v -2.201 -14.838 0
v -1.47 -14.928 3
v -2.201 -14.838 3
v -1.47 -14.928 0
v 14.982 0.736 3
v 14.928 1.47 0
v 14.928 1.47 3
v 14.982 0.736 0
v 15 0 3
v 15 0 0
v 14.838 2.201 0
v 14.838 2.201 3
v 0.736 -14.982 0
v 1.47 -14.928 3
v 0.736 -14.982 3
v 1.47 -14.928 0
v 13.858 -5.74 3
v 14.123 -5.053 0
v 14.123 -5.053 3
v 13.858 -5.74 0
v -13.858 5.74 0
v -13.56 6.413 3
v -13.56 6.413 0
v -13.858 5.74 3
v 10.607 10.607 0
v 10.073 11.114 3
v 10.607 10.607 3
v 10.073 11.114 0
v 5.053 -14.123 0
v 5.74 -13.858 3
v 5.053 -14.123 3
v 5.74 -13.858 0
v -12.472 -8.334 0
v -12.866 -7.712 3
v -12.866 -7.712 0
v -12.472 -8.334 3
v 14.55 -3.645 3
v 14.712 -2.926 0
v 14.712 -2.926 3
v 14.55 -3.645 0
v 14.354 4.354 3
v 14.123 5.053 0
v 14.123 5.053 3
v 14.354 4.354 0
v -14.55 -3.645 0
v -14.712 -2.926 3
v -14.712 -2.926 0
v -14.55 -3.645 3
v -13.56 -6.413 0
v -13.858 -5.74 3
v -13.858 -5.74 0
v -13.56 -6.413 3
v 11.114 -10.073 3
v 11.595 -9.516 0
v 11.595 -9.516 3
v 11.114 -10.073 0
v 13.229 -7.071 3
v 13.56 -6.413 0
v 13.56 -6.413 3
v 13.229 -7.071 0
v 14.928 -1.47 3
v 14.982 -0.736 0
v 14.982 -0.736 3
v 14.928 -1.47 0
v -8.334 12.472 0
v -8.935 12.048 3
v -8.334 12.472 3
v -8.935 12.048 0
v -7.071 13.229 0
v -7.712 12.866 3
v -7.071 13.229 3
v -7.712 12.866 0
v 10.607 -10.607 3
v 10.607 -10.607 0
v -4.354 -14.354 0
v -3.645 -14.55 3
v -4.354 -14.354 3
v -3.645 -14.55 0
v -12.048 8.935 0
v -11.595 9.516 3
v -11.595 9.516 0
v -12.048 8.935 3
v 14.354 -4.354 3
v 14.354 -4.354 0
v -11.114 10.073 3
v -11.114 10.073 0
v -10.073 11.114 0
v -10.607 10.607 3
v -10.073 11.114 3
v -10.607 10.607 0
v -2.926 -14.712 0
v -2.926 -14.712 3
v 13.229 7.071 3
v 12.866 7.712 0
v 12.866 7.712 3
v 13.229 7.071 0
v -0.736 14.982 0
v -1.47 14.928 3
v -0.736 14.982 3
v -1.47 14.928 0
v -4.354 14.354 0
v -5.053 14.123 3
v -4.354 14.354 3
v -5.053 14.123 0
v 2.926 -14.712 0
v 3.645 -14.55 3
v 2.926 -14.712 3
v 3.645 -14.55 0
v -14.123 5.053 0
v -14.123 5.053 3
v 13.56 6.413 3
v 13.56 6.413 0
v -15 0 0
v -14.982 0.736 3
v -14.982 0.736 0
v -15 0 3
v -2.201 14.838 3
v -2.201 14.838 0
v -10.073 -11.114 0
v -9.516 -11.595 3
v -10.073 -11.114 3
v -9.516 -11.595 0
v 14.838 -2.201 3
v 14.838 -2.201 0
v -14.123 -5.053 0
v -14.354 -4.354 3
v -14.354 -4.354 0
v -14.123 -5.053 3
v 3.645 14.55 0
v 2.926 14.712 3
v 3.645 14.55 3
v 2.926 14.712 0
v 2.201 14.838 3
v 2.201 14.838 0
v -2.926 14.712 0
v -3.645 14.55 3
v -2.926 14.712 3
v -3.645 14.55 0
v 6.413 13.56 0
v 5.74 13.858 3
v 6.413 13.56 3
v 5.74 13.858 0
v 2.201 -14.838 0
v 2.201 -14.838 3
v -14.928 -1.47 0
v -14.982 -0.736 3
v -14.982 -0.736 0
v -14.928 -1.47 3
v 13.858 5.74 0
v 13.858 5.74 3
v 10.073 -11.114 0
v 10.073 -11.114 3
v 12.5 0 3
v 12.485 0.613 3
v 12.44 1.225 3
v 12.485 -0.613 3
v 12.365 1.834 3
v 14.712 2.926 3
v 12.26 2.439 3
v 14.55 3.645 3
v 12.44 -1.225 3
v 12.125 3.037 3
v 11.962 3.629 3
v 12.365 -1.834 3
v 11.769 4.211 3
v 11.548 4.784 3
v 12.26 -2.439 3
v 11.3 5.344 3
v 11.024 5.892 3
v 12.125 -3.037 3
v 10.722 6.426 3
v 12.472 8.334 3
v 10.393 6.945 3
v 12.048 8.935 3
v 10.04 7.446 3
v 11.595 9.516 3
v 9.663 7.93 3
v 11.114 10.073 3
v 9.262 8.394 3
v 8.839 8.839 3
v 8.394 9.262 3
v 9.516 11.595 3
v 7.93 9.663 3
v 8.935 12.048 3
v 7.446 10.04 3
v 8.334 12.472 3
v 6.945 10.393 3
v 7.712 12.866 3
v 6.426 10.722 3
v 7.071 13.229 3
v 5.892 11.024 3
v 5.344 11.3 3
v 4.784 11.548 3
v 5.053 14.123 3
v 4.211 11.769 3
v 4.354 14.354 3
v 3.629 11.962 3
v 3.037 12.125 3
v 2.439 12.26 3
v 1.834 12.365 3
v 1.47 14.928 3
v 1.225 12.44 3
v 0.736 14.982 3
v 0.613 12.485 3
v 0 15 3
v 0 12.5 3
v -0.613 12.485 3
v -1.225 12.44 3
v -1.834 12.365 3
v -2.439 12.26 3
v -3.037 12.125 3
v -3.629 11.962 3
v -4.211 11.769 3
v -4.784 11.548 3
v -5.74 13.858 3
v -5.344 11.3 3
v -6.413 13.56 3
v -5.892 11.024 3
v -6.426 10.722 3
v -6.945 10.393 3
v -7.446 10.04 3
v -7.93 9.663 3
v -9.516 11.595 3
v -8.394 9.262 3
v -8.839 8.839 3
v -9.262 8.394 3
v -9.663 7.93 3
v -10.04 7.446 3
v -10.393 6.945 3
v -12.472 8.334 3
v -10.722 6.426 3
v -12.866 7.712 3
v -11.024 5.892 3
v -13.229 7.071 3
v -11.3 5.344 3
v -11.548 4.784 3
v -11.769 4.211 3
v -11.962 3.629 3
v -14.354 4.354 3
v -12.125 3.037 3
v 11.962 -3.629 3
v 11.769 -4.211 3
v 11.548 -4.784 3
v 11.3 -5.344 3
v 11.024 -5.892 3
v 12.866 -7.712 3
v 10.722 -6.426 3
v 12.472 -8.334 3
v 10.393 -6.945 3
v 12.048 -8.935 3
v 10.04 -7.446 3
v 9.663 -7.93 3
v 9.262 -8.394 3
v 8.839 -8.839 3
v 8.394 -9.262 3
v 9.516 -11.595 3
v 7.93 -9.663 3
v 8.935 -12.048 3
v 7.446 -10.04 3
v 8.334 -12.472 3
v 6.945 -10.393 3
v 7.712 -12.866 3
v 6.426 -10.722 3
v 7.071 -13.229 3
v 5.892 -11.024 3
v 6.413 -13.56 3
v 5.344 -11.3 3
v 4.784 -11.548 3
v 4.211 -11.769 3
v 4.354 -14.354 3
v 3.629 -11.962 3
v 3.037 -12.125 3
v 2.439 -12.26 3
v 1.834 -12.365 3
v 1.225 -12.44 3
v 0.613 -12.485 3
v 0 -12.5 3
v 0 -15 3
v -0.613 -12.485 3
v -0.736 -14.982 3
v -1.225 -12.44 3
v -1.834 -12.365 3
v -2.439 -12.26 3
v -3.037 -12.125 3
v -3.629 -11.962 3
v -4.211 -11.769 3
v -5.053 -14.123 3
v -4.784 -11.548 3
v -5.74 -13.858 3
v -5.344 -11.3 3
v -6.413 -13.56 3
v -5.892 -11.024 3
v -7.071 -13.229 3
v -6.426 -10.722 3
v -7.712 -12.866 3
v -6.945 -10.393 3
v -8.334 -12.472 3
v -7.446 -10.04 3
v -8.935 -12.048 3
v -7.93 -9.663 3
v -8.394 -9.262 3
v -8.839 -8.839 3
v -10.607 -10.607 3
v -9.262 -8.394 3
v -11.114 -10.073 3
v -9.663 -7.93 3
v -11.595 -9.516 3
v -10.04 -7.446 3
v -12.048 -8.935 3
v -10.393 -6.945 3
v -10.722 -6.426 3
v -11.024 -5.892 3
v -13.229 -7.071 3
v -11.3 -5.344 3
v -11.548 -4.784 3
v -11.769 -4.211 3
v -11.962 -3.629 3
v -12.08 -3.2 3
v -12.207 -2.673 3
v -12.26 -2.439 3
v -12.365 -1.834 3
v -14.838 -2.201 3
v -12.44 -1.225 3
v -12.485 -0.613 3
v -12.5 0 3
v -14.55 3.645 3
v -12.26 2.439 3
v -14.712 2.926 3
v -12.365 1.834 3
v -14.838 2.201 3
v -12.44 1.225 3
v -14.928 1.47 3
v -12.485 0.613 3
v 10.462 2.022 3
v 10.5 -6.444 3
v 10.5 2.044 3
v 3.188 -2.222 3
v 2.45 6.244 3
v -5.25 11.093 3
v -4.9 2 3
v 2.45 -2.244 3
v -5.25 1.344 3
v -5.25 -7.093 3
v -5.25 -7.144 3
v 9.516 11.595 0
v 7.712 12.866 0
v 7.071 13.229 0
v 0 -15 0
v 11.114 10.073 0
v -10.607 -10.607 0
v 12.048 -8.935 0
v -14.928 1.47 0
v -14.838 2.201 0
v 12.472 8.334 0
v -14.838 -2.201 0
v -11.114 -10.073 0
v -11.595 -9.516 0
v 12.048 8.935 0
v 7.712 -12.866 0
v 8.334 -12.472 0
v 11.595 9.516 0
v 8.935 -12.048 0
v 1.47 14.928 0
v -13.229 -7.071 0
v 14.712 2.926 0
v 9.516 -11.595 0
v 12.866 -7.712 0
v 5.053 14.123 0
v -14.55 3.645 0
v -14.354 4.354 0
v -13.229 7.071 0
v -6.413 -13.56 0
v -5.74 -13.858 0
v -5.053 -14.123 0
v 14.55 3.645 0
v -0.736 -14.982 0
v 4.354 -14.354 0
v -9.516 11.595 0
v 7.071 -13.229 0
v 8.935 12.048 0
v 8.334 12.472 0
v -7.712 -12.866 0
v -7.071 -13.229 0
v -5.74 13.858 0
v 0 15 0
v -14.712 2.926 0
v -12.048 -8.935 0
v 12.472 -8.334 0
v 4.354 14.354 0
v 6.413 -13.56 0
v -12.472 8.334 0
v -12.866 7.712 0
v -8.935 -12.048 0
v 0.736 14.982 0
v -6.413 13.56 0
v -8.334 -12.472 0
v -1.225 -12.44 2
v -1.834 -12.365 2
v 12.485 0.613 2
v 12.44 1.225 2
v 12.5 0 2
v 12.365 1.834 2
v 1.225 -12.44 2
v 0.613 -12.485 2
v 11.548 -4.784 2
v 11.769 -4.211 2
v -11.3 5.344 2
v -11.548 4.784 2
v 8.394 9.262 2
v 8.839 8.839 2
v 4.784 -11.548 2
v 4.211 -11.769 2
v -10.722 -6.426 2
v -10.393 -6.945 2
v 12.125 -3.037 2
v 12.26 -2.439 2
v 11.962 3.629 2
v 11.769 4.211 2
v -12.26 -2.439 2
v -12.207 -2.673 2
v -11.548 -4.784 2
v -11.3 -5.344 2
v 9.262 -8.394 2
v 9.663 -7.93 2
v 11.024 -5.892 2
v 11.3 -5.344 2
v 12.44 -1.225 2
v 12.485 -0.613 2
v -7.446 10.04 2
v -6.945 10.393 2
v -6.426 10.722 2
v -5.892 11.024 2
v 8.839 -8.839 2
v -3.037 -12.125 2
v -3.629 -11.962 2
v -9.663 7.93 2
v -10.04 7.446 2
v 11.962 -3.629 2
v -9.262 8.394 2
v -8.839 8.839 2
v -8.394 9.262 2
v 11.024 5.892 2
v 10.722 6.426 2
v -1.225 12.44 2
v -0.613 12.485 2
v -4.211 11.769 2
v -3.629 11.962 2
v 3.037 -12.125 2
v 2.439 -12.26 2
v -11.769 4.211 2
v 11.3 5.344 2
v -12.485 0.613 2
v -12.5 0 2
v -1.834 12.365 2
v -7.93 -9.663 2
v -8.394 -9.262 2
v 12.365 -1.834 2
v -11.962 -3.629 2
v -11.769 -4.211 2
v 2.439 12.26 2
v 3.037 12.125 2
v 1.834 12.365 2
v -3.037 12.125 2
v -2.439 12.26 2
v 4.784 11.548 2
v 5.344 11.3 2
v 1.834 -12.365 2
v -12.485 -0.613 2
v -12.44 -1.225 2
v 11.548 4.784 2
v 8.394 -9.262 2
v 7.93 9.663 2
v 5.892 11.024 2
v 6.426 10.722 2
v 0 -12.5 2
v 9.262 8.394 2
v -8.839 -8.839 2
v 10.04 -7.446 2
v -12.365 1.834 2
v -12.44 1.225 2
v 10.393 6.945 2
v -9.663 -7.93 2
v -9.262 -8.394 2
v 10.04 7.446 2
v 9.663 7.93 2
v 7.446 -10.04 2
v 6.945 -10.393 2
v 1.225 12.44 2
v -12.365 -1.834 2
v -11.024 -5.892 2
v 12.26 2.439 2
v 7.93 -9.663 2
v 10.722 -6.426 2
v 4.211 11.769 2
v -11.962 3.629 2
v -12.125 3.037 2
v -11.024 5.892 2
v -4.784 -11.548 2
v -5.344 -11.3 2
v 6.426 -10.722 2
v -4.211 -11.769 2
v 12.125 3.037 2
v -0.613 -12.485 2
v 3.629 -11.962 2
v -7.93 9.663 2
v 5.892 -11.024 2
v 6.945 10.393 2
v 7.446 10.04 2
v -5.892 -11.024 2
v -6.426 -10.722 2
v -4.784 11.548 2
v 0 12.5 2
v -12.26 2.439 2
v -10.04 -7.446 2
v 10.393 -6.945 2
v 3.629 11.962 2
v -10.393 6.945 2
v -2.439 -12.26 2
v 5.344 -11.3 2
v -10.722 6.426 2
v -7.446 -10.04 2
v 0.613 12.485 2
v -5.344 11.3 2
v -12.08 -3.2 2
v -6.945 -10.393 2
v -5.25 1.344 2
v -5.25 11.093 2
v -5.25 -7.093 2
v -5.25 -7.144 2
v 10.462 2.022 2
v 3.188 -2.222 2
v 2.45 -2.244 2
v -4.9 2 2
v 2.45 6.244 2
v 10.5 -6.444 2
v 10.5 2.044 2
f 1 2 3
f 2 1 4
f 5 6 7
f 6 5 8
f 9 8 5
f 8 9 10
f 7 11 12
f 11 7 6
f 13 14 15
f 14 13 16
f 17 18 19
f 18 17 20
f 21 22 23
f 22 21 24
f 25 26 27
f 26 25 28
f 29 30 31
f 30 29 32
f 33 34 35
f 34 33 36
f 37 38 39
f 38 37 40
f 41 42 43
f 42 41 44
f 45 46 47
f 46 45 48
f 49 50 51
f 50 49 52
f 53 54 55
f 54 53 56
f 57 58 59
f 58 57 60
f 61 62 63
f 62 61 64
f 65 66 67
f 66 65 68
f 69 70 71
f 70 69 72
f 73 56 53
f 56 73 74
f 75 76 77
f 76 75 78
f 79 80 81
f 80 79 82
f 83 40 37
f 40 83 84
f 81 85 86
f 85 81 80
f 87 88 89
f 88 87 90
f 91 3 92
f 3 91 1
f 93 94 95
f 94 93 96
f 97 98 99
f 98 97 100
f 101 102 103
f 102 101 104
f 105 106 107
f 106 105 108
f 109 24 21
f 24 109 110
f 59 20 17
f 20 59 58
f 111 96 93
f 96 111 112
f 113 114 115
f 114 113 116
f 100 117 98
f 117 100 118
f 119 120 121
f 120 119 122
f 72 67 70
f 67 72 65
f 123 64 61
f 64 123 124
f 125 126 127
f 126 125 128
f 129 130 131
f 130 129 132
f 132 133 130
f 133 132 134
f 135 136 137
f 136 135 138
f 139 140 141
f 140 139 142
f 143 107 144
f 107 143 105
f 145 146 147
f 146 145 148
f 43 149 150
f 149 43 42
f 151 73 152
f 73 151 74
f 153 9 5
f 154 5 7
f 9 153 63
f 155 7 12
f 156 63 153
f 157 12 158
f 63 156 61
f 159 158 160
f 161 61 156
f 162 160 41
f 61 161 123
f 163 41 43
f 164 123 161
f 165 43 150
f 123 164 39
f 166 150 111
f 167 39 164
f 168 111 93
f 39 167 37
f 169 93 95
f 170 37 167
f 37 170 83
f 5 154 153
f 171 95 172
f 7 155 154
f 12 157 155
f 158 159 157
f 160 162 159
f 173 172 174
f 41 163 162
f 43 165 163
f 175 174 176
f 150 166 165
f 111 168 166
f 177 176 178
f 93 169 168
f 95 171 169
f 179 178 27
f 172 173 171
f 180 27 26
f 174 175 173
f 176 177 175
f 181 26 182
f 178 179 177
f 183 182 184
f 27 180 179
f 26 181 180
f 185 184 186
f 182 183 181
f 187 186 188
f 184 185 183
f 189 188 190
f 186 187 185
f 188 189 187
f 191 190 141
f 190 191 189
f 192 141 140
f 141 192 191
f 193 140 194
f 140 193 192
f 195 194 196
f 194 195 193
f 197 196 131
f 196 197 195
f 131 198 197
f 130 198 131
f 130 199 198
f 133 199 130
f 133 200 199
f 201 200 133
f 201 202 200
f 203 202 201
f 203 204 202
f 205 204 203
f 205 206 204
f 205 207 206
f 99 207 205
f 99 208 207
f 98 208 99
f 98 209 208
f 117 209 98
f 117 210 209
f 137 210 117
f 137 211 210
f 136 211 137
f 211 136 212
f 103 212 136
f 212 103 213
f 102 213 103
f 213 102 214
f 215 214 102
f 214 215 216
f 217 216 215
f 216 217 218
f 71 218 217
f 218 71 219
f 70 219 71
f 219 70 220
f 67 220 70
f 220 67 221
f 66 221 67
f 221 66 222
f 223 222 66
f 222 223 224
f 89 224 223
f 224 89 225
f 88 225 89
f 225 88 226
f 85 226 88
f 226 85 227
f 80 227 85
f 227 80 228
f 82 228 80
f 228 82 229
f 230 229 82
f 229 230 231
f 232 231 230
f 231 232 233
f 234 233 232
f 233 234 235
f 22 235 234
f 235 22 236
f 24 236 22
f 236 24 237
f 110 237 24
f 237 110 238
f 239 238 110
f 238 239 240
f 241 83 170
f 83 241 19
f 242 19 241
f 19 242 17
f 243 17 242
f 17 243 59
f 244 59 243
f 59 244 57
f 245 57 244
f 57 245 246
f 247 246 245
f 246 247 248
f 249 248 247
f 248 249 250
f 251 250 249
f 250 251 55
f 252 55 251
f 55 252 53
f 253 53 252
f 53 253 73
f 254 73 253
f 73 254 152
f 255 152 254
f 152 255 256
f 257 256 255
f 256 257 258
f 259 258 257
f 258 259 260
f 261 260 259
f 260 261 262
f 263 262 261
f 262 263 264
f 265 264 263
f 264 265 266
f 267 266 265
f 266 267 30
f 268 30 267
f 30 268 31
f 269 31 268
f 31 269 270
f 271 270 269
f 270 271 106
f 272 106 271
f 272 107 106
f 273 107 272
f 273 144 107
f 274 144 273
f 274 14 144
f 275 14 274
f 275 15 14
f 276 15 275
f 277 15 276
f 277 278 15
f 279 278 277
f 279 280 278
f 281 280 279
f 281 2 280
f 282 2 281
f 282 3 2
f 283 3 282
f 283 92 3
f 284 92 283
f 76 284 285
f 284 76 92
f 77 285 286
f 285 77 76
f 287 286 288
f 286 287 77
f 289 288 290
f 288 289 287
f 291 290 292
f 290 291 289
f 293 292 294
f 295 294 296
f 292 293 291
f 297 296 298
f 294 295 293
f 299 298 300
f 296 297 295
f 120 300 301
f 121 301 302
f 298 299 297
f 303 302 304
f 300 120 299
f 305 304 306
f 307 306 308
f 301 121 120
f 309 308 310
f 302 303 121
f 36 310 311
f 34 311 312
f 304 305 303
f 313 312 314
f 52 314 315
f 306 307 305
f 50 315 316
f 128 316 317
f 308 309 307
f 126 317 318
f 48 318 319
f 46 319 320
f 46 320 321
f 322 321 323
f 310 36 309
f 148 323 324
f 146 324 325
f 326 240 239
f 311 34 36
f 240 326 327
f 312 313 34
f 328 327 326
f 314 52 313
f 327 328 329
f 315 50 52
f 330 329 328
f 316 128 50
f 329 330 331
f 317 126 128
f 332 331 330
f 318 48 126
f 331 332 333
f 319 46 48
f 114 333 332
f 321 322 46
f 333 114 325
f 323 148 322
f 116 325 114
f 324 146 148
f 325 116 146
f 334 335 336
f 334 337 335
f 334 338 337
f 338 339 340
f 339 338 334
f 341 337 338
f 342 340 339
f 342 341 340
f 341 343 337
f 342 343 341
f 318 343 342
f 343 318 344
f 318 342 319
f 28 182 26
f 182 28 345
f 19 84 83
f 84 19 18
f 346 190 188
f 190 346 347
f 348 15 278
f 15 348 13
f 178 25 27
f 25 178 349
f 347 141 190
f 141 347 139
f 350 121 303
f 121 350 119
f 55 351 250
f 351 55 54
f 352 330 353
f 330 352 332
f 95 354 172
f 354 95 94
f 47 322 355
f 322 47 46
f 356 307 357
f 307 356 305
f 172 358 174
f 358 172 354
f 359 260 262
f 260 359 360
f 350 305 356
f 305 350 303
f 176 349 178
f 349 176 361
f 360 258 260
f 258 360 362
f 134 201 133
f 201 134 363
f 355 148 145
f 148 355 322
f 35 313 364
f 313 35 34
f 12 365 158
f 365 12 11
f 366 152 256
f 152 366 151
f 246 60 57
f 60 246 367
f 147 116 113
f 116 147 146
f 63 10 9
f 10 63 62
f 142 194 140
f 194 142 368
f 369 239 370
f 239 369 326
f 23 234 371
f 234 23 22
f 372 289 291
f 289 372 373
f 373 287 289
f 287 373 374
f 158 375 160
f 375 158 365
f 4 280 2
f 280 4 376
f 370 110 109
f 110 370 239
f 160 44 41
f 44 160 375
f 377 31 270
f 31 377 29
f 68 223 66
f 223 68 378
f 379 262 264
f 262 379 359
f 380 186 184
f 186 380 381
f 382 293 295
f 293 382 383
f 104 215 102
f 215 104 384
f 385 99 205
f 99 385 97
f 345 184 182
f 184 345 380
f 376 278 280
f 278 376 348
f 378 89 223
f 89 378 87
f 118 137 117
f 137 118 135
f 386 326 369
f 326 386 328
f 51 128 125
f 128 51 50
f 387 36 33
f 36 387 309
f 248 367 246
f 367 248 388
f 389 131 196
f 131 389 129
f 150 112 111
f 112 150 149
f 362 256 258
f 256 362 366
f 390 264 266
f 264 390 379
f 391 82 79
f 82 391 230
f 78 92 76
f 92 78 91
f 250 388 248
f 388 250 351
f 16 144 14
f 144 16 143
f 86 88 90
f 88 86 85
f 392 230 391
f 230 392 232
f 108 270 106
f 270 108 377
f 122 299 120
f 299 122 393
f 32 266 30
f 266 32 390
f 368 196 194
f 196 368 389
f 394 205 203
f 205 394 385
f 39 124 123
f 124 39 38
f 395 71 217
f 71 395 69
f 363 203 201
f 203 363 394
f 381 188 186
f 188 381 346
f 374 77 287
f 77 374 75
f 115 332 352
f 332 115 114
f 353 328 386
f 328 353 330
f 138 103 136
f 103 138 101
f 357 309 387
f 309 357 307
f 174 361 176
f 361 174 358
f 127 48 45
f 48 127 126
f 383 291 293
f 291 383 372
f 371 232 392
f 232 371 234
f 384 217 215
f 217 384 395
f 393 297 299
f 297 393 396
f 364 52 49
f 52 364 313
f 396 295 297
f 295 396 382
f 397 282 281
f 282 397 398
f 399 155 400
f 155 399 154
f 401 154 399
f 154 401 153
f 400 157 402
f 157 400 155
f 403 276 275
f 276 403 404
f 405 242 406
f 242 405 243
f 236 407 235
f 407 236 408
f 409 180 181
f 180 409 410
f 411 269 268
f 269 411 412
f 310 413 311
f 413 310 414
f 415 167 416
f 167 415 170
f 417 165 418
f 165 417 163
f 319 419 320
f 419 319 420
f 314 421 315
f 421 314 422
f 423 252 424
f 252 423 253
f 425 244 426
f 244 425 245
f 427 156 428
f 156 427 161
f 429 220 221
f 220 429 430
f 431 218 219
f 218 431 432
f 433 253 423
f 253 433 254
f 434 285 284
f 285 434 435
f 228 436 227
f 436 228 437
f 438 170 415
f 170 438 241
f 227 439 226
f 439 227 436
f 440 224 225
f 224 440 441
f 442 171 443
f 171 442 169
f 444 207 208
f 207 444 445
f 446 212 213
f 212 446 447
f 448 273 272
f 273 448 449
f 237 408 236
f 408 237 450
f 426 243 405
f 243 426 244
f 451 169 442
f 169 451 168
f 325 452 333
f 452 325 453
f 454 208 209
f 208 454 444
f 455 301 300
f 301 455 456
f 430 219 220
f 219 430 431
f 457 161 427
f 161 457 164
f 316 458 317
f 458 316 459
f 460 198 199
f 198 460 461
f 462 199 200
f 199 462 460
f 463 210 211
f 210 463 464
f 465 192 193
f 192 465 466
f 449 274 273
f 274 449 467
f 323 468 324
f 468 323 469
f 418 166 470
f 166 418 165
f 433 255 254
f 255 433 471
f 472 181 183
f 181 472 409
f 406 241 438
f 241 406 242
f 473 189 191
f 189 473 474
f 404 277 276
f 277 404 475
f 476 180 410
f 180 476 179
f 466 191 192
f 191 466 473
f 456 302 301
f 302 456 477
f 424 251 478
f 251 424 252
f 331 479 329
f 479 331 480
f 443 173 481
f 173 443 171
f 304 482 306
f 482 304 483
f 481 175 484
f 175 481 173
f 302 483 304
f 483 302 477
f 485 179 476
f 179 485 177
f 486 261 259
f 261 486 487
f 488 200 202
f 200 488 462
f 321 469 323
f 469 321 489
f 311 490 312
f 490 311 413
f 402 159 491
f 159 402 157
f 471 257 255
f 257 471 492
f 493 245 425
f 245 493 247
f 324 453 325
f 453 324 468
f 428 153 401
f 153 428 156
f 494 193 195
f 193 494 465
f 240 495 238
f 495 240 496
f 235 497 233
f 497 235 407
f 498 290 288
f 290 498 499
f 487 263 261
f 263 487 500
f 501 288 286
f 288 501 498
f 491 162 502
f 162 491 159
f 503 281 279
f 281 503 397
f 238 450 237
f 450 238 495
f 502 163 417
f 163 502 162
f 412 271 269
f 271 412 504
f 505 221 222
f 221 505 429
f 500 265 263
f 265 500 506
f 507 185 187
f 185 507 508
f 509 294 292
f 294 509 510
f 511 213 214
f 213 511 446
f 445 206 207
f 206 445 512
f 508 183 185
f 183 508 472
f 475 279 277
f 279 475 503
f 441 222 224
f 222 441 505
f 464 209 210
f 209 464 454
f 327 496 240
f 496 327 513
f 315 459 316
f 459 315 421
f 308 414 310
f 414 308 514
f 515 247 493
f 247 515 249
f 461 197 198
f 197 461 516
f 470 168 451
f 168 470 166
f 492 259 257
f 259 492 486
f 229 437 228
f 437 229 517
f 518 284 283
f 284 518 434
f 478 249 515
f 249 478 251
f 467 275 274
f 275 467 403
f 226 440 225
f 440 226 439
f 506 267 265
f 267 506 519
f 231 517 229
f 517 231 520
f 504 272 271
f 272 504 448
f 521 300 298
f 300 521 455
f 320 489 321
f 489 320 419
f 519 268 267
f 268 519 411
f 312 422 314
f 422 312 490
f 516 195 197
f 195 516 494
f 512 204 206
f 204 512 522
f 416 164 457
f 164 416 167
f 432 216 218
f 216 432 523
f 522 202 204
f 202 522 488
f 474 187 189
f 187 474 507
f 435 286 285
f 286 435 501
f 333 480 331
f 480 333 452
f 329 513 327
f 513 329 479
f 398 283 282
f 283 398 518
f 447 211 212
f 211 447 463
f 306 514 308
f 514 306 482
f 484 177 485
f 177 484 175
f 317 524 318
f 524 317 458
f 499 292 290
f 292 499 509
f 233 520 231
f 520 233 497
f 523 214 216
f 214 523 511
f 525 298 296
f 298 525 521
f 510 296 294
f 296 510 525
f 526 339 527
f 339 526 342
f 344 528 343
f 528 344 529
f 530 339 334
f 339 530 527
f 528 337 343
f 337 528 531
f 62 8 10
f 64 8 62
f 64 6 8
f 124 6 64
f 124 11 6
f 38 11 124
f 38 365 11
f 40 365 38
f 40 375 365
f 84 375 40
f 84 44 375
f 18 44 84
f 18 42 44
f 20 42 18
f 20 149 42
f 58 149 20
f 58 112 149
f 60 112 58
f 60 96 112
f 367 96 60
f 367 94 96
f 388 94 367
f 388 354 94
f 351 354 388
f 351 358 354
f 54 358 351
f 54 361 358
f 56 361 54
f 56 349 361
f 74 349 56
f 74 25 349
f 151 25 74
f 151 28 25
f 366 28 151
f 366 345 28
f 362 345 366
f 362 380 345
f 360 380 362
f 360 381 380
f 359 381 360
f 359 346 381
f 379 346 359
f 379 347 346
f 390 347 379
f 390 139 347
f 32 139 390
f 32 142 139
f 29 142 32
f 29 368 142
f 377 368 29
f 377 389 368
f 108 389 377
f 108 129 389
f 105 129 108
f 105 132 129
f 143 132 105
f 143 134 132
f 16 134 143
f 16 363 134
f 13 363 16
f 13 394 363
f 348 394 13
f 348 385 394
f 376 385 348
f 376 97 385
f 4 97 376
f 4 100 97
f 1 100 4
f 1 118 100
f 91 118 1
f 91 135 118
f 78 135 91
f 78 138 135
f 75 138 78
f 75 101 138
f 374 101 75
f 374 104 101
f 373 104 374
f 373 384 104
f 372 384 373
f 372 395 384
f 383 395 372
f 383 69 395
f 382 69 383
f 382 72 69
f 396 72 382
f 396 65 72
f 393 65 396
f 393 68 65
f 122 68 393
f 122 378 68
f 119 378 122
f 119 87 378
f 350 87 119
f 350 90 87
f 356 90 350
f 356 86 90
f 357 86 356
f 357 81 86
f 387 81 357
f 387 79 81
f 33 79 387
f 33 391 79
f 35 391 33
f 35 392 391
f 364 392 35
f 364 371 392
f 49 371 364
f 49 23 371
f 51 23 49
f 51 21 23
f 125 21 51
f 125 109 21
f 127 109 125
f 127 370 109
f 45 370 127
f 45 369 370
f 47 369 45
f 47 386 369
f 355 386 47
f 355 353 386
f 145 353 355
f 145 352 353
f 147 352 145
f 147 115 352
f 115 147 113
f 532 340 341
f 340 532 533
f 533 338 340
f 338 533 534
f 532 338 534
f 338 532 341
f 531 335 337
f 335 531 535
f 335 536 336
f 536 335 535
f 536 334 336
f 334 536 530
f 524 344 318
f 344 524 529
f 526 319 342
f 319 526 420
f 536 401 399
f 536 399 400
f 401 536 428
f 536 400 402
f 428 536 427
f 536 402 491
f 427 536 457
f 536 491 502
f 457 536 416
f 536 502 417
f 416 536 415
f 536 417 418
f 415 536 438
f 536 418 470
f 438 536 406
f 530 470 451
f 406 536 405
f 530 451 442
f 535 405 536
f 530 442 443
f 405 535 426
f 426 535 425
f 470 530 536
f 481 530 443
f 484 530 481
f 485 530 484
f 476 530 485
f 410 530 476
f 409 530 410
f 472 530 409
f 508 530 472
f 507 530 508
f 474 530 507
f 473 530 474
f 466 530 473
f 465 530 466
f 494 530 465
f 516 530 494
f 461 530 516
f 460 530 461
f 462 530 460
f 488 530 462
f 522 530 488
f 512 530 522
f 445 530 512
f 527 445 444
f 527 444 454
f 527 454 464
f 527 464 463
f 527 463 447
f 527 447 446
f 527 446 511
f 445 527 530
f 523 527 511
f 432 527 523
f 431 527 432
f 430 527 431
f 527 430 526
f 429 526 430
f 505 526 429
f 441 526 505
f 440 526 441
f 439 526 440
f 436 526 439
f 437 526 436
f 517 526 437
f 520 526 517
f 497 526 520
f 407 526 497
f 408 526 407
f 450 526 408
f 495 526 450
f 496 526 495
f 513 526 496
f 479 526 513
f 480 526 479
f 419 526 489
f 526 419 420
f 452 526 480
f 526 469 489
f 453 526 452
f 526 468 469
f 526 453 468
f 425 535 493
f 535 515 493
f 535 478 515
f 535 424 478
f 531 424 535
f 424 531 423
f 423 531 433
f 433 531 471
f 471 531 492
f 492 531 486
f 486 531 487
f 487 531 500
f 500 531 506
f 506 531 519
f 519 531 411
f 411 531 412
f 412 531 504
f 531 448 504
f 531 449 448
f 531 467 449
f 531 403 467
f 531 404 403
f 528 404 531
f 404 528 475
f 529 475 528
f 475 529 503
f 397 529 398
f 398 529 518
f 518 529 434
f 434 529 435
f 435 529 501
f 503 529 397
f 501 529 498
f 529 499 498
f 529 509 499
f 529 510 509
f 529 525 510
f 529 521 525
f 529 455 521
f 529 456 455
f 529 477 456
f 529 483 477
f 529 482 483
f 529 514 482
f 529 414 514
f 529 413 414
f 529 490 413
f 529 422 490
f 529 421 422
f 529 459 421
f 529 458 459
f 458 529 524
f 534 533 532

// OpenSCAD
$fn=128 ;
translate ([0,0,1]) difference () {
cylinder (r1=15,r2=15,h=2) ;
translate ([0,0,-0.5]) cylinder (r1=12.5,r2=12.5,h=3) ;
}
cylinder (r1=15,r2=15,h=2) ;


x=5 ;
h=4 ;
module rvk(){
difference () {
cylinder (3,15,15,$fn=3) ;
translate ([0,0,-1])rotate(180, 0, 0) cylinder (7,7,7,$fn=3) ;
}
translate ([11.5,-6,0])rotate(180, 0, 0) cylinder (3,7,7,$fn=3) ;
translate ([-11,-7,])rotate(180, 0, 0)cylinder (3,7,7,$fn=3) ;
}

translate ([0,2,0])scale ([0.7,0.7,1]) rvk();
